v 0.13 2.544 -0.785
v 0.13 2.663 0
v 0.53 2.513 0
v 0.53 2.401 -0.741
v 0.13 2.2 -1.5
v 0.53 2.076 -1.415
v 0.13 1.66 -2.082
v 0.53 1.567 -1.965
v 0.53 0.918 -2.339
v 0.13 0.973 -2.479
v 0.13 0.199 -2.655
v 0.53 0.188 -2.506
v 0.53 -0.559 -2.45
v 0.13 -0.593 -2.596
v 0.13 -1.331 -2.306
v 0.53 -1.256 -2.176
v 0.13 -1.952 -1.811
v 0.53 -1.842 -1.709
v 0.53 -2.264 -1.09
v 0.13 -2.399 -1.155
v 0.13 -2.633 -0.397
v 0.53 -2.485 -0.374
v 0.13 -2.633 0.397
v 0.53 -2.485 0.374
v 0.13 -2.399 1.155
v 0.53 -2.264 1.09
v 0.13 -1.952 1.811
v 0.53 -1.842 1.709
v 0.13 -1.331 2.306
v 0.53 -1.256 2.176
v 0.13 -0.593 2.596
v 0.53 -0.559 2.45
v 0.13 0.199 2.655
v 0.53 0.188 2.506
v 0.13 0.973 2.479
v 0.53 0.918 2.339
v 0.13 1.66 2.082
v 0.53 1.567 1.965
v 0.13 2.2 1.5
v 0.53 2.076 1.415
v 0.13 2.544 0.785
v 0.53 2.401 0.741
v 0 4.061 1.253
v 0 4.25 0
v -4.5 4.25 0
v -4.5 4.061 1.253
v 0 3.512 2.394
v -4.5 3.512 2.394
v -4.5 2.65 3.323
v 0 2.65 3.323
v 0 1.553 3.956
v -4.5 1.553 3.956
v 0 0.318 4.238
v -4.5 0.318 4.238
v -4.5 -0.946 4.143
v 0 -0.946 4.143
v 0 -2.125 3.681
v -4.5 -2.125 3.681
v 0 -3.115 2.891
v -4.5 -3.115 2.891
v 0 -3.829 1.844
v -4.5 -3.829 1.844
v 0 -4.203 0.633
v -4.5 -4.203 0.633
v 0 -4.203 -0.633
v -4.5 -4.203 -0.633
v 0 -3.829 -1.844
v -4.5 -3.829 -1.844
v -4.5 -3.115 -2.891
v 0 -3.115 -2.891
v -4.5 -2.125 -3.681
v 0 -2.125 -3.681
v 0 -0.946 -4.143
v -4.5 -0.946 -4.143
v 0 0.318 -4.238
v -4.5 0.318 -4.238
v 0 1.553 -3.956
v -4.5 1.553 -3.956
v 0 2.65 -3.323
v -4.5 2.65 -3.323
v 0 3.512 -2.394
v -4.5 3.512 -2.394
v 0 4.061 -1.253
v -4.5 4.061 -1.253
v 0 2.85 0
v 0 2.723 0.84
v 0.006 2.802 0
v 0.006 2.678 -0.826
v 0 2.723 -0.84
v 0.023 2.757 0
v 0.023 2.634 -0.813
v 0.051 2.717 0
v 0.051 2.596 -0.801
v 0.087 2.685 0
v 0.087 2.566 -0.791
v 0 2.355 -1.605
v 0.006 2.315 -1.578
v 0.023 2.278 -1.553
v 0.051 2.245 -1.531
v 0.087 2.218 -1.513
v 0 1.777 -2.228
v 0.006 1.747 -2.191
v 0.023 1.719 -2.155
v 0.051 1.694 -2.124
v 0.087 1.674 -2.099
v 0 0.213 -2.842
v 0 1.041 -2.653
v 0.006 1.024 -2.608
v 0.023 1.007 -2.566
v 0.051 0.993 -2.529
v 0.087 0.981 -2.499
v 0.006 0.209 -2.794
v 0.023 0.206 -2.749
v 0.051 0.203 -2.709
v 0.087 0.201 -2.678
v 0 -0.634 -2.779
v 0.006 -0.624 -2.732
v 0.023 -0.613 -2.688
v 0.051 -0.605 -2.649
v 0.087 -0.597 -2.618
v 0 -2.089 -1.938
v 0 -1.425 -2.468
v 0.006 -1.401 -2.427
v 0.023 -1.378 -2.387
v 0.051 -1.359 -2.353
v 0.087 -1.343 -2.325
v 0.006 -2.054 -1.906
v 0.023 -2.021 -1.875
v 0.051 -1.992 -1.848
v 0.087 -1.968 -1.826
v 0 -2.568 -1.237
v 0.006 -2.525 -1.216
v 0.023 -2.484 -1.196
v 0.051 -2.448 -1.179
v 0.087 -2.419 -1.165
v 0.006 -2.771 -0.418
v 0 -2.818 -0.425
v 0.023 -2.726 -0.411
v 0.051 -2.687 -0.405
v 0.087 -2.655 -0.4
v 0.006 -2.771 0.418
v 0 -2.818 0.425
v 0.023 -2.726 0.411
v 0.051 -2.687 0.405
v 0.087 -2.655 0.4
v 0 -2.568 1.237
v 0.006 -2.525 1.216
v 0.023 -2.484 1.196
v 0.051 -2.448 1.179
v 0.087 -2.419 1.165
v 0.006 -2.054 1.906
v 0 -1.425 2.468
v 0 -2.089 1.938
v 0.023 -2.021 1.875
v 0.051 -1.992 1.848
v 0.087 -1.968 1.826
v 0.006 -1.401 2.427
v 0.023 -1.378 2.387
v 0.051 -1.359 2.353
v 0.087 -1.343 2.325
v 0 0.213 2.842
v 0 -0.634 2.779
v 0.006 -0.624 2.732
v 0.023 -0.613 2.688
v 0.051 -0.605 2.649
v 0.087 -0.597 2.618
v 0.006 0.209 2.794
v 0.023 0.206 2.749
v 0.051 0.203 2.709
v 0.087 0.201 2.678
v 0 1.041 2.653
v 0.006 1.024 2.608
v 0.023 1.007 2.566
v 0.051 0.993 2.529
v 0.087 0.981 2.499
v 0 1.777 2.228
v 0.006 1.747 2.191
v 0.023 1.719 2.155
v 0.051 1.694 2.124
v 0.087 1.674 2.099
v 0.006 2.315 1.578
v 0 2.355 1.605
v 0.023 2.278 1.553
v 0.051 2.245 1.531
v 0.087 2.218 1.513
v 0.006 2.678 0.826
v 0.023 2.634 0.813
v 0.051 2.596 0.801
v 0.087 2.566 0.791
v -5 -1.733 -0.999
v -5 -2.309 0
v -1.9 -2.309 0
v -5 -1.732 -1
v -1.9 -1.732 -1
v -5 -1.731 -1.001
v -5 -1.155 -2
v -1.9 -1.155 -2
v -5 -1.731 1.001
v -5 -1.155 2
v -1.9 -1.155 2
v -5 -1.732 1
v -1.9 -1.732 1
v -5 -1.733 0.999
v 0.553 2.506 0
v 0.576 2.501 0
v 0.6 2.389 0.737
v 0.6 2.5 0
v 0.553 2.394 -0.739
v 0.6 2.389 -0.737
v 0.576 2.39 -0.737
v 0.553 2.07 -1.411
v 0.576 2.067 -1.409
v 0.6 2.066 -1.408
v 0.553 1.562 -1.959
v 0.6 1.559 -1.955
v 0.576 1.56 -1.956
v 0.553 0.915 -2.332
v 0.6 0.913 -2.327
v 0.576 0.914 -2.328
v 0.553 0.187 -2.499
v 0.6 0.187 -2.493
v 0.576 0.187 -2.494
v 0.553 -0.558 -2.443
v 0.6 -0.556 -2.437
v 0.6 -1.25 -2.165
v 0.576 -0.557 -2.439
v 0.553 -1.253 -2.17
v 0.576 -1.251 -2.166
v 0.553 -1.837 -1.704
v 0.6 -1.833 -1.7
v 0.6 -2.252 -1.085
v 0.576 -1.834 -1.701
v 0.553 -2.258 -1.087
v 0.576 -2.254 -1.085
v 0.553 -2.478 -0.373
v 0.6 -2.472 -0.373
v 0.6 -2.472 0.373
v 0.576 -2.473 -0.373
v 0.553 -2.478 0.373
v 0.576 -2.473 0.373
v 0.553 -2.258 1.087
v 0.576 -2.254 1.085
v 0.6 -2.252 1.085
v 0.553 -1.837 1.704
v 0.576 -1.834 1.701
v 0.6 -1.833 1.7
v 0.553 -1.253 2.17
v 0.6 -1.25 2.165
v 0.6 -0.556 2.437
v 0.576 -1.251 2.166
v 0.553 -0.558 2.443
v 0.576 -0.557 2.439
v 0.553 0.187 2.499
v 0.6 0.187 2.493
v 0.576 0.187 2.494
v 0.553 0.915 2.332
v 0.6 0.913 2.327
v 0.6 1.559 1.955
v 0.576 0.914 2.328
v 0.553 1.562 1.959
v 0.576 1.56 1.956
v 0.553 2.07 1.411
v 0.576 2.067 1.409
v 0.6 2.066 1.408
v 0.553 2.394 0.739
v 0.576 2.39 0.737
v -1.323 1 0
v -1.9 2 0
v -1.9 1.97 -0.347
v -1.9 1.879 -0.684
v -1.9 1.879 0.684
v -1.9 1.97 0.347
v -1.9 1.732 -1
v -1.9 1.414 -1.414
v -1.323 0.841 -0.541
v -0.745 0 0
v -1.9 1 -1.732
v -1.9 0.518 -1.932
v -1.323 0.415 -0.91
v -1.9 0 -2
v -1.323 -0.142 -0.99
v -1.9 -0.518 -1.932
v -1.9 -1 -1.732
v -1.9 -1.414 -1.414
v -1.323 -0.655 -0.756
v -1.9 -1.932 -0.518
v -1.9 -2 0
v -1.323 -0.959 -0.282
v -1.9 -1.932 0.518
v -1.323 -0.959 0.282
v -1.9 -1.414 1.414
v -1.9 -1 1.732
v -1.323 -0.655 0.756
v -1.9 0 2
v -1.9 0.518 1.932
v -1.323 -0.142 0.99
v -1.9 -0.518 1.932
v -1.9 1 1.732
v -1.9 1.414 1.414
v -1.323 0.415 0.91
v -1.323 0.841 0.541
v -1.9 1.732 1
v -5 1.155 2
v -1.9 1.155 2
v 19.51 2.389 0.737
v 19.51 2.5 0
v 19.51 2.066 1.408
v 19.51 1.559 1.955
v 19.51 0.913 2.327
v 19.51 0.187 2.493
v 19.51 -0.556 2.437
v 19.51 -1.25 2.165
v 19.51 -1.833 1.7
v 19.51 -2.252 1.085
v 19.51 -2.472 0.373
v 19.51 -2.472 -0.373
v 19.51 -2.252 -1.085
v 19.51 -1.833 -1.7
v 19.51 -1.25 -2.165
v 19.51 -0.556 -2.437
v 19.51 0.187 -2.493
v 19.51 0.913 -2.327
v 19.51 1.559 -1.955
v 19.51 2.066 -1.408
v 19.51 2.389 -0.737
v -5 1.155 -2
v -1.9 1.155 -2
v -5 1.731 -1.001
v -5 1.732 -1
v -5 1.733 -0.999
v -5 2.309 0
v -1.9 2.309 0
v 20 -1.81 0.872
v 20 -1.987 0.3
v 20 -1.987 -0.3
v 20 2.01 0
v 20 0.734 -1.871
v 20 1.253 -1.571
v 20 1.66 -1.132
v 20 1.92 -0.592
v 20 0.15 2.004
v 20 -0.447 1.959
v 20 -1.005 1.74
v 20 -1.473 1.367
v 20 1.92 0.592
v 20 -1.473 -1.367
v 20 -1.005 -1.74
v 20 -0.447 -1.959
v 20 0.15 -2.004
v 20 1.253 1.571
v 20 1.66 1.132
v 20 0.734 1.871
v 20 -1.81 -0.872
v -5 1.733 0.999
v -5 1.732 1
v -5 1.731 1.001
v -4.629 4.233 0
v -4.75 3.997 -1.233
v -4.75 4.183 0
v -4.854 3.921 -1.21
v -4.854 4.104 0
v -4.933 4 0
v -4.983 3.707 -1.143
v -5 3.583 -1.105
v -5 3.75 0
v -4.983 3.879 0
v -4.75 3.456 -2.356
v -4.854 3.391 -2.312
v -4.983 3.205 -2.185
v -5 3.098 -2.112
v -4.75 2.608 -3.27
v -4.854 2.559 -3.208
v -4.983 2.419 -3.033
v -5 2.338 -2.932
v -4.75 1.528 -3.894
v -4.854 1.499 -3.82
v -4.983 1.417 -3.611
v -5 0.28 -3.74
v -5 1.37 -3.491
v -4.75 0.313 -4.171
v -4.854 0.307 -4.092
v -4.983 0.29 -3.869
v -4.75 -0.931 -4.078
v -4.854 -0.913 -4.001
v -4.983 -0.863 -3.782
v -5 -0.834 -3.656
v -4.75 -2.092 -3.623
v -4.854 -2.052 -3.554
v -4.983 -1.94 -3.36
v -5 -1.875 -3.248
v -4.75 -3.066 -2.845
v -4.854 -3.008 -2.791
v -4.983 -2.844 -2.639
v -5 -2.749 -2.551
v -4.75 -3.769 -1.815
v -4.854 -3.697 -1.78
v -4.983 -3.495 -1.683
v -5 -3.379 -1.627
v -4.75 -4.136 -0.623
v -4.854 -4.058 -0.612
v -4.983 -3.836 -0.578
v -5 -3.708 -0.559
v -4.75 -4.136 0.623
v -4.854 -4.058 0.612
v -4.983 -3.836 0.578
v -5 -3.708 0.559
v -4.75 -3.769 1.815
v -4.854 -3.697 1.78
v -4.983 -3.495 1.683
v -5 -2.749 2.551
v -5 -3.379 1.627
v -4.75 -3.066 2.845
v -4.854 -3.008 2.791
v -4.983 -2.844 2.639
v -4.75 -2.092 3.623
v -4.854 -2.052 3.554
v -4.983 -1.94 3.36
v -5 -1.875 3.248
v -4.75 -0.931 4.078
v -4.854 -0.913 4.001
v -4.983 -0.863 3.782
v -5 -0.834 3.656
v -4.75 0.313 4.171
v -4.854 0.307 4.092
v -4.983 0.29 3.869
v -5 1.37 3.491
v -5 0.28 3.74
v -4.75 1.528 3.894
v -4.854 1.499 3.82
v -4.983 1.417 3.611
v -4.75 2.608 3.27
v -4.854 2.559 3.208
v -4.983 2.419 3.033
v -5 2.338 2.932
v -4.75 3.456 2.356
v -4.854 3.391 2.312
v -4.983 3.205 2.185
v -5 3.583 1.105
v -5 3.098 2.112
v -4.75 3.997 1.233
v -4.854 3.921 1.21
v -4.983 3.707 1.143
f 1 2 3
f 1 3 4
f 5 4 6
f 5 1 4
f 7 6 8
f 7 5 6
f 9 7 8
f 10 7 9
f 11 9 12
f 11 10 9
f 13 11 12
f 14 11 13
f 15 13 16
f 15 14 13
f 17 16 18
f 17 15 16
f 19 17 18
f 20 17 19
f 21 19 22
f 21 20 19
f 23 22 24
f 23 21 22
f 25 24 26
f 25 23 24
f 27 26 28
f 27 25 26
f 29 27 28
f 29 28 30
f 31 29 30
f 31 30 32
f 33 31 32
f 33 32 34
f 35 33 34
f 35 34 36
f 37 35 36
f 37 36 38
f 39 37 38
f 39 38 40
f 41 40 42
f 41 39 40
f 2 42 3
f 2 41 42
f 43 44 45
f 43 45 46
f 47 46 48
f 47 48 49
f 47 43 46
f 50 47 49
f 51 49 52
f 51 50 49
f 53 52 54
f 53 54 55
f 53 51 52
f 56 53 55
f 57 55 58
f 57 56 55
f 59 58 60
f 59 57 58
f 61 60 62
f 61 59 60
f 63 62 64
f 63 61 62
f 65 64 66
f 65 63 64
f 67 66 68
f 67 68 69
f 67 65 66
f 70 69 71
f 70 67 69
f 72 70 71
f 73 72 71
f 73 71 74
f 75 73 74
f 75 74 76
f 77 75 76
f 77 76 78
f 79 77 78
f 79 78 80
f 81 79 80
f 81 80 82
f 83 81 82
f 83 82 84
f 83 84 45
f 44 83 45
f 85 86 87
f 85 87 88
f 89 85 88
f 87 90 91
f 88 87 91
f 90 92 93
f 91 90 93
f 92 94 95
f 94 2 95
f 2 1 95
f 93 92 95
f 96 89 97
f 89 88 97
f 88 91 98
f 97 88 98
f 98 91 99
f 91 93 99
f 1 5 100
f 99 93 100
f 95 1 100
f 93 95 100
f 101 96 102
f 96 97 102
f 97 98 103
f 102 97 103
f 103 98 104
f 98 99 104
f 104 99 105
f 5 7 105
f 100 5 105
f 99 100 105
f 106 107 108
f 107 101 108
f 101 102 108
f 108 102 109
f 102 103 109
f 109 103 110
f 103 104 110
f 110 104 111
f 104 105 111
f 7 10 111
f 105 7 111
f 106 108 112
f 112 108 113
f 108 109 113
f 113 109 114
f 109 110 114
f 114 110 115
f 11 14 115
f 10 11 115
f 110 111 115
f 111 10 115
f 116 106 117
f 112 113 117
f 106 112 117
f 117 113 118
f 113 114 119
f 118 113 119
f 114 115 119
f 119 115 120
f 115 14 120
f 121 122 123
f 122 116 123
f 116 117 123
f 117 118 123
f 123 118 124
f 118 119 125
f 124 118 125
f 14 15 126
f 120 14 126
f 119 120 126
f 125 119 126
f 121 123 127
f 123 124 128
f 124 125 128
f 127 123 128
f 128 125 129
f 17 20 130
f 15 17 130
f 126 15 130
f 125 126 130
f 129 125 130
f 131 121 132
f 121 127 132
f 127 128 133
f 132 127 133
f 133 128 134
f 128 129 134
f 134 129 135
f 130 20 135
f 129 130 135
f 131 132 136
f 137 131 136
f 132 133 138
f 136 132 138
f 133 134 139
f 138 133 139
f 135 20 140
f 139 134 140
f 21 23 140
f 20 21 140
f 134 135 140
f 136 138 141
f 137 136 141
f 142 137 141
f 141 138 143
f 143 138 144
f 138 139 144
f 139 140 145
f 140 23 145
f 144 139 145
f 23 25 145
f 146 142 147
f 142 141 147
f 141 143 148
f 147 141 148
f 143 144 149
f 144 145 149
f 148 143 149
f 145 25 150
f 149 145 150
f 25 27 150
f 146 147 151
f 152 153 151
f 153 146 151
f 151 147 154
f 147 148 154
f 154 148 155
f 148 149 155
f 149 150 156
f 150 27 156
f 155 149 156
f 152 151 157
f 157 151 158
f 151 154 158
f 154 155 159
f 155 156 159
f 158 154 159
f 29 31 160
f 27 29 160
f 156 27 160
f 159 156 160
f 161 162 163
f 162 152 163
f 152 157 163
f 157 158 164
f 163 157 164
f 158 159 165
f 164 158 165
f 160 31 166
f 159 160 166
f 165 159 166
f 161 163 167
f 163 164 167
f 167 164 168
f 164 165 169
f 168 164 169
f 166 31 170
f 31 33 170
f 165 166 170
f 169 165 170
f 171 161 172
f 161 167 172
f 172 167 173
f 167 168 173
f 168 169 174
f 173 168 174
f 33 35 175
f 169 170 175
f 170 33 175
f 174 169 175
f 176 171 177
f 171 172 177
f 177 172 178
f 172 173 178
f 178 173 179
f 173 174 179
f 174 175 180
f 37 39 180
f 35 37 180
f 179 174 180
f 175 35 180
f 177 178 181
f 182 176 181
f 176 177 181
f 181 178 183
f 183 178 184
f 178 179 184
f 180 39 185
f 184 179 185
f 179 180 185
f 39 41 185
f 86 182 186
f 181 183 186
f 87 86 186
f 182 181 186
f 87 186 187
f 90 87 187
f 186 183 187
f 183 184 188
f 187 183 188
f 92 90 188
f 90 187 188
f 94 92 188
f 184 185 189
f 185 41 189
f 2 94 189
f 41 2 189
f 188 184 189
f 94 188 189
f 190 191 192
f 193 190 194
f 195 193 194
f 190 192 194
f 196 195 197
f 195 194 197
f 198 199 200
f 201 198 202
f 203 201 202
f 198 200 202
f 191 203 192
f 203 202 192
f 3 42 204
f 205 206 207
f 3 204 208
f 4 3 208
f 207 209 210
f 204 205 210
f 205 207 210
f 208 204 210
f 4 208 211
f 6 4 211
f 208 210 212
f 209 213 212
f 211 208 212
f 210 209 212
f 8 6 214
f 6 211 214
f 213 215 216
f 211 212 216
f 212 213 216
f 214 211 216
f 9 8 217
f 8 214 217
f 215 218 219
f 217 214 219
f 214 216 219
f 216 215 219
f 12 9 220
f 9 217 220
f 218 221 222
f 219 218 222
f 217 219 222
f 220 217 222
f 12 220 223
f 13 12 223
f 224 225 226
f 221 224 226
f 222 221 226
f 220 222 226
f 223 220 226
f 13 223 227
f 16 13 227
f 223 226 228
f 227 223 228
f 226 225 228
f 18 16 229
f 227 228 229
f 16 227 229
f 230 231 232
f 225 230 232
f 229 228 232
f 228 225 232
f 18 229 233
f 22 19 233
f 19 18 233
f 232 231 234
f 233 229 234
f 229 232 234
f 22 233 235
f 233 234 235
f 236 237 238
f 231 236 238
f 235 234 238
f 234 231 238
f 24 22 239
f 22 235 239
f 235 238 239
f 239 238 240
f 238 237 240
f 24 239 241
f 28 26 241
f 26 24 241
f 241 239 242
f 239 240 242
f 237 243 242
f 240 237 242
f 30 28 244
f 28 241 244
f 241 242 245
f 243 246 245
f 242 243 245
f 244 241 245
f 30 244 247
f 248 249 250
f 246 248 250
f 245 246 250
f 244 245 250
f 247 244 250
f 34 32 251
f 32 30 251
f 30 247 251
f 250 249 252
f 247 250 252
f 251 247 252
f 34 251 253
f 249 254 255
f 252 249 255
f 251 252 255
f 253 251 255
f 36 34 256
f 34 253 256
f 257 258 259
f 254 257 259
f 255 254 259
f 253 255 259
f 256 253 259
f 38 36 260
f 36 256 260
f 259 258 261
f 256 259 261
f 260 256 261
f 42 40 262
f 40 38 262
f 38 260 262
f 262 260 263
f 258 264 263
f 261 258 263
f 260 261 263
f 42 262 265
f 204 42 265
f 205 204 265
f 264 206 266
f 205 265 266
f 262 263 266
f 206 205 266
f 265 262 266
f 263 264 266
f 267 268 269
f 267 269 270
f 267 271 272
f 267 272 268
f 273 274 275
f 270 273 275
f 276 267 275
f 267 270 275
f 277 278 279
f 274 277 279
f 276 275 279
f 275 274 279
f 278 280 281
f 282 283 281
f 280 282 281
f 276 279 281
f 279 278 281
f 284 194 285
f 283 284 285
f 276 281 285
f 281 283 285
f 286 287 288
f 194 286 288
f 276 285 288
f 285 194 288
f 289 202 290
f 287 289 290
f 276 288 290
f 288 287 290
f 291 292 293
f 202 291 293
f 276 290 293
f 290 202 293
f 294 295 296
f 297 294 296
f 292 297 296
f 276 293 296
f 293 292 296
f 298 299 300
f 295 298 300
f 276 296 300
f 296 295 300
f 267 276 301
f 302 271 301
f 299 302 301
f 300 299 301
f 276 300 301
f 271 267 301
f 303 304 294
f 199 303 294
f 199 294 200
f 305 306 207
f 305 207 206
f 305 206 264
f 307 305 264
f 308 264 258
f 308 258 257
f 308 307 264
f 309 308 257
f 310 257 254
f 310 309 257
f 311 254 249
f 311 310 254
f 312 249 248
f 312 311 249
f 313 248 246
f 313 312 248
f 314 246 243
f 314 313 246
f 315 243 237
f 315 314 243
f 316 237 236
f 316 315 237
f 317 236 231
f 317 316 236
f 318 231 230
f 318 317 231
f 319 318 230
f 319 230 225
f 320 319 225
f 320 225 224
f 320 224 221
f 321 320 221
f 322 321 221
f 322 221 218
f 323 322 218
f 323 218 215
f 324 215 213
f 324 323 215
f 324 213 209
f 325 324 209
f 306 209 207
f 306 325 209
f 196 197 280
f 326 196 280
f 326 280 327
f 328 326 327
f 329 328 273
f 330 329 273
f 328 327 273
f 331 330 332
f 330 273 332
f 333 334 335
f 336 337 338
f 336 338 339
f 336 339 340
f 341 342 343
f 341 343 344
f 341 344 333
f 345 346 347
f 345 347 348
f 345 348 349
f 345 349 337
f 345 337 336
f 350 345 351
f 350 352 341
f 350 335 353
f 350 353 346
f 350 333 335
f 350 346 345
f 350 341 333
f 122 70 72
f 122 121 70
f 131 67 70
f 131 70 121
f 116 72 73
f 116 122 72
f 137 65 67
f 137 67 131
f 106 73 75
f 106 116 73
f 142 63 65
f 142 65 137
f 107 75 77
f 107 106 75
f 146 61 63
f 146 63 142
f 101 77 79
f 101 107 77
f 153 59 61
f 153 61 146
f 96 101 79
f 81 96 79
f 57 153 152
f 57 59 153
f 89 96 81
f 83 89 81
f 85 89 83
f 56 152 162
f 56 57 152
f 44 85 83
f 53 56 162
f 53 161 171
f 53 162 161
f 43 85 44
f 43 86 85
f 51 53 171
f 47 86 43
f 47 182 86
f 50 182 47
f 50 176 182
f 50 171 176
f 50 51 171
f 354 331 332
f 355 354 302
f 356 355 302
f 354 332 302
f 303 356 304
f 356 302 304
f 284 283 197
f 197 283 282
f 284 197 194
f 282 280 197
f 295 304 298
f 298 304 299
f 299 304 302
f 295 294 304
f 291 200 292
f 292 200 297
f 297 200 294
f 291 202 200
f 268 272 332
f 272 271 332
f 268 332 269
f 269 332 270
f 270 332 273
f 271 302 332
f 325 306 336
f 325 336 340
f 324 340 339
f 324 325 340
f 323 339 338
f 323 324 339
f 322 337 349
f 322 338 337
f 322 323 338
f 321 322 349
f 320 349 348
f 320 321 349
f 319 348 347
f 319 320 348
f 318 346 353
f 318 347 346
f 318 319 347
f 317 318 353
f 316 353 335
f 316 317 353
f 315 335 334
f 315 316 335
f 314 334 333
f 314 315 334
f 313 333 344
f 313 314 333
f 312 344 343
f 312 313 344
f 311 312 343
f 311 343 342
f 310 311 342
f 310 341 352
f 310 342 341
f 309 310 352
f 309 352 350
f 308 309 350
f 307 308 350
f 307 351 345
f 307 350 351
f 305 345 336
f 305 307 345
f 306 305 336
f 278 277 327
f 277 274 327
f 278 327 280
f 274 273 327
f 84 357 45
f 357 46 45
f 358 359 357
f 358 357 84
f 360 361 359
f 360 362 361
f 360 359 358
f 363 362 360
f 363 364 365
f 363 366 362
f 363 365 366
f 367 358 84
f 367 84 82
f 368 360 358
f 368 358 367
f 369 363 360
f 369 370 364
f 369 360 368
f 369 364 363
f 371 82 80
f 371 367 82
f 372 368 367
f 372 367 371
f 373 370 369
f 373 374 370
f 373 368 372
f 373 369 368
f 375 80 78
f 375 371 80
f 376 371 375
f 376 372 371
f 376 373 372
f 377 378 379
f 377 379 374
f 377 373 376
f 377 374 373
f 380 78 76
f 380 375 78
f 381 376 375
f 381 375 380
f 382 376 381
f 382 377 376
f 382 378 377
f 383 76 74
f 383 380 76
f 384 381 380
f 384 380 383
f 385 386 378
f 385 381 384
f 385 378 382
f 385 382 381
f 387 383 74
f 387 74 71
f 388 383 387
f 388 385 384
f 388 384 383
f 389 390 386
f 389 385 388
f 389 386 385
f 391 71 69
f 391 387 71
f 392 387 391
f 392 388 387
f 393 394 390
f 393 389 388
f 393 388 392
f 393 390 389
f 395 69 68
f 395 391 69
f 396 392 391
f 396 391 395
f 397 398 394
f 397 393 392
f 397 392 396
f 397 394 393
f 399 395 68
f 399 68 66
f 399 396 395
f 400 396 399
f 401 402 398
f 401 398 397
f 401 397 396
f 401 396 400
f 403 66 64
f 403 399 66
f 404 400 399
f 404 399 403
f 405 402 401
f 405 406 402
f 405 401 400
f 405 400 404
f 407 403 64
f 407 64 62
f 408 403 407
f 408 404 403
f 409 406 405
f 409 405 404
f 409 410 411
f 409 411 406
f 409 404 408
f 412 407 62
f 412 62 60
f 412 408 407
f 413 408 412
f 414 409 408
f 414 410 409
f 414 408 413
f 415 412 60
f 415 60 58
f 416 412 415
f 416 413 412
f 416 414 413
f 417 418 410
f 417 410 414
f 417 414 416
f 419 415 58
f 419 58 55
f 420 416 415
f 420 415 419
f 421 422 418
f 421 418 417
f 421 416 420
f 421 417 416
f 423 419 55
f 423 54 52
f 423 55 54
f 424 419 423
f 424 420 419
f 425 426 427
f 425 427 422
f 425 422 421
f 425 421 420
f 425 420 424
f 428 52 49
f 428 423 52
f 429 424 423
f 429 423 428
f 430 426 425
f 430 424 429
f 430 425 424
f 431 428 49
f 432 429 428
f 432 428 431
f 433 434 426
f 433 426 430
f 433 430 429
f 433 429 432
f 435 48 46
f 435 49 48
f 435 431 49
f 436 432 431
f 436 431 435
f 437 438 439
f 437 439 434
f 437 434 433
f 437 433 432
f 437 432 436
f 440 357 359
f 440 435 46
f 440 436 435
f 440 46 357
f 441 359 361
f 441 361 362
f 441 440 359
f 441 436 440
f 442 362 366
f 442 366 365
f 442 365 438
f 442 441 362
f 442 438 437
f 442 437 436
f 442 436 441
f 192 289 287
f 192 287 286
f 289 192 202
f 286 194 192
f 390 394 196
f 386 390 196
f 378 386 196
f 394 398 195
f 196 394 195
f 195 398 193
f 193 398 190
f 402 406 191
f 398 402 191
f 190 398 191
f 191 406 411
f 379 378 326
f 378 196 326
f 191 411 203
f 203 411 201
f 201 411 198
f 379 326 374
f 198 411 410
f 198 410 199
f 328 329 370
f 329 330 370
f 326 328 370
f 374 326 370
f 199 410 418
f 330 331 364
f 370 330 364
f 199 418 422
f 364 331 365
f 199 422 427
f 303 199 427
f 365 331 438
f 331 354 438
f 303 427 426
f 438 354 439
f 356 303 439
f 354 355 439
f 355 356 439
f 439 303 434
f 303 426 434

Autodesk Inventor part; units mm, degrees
sketch "Skizze_2" plane through (0, 0, 0) normal (0, 0, 1) x (1, 0, 0)
  line L0 (20, 0) -> (-0.7453, 0)
  line L1 (-0.7453, 0) -> (-1.9, 2)
  line L2 (-1.9, 2) -> (-5, 2)
  line L3 (-5, 2) -> (-5, 3.75)
  arc A0 (-4.5, 4.25) -> (-5, 3.75) centre (-4.5, 3.75) ccw
  line L4 (-4.5, 4.25) -> (0, 4.25)
  line L5 (0, 4.25) -> (0, 2.85)
  arc A1 (0, 2.85) -> (0.1298, 2.6627) centre (0.2, 2.85) ccw
  line L6 (0.1298, 2.6627) -> (0.5298, 2.5127)
  arc A2 (0.5298, 2.5127) -> (0.6, 2.5) centre (0.6, 2.7) ccw
  line L7 (0.6, 2.5) -> (19.5095, 2.5)
  line L8 (19.5095, 2.5) -> (20, 2.0095)
  line L9 (20, 2.0095) -> (20, 0)
  line L10 (20, 0) -> (-0.7453, 0)
revolve "Revolution1" add sketch "Skizze_2" angle 360 about axis through (20, 0, 0) along (1, 0, 0)
thread "Thread1" size "M5x0.8" class "6g" standard "ISO Metric profile" length 1.9095
sketch "Skizze_1" plane through (-1.9, 0, 0) normal (1, 0, 0) x (0, 0, -1)
  line L0 (-2, 1.1547) -> (-2, -1.1547)
  line L1 (-2, -1.1547) -> (0, -2.3094)
  line L2 (0, -2.3094) -> (2, -1.1547)
  line L3 (2, -1.1547) -> (2, 1.1547)
  line L4 (2, 1.1547) -> (0, 2.3094)
  line L5 (0, 2.3094) -> (-2, 1.1547)
extrude "Extrusion1" cut sketch "Skizze_1" against normal blind 5
ref_plane "IP1_XY" through (0, 0, 0) normal (1, 0, 0) x (0, 0, -1)
ref_plane "IP1_YZ" through (0, 0, 0) normal (0, 0, -1) x (0, 1, 0)
ref_plane "IP1_ZX" through (0, 0, 0) normal (0, 1, 0) x (1, 0, 0)
ref_plane "IP2_XY" through (-5, 0, 0) normal (1, 0, 0) x (0, 0, -1)
ref_plane "IP2_YZ" through (-5, 0, 0) normal (0, 0, -1) x (0, 1, 0)
ref_plane "IP2_ZX" through (-5, 0, 0) normal (0, 1, 0) x (1, 0, 0)
ref_plane "IP3_XY" through (20, 0, 0) normal (1, 0, 0) x (0, 0, -1)
ref_plane "IP3_YZ" through (20, 0, 0) normal (0, 0, -1) x (0, 1, 0)
ref_plane "IP3_ZX" through (20, 0, 0) normal (0, 1, 0) x (1, 0, 0)
ref_plane "IP4_XY" through (0, 0, 0) normal (1, 0, 0) x (0, 0, -1)
ref_plane "IP4_YZ" through (0, 0, 0) normal (0, 0, -1) x (0, 1, 0)
ref_plane "IP4_ZX" through (0, 0, 0) normal (0, 1, 0) x (1, 0, 0)
properties part number "Slotted head cap screw ISO 4762 - M5x20"
